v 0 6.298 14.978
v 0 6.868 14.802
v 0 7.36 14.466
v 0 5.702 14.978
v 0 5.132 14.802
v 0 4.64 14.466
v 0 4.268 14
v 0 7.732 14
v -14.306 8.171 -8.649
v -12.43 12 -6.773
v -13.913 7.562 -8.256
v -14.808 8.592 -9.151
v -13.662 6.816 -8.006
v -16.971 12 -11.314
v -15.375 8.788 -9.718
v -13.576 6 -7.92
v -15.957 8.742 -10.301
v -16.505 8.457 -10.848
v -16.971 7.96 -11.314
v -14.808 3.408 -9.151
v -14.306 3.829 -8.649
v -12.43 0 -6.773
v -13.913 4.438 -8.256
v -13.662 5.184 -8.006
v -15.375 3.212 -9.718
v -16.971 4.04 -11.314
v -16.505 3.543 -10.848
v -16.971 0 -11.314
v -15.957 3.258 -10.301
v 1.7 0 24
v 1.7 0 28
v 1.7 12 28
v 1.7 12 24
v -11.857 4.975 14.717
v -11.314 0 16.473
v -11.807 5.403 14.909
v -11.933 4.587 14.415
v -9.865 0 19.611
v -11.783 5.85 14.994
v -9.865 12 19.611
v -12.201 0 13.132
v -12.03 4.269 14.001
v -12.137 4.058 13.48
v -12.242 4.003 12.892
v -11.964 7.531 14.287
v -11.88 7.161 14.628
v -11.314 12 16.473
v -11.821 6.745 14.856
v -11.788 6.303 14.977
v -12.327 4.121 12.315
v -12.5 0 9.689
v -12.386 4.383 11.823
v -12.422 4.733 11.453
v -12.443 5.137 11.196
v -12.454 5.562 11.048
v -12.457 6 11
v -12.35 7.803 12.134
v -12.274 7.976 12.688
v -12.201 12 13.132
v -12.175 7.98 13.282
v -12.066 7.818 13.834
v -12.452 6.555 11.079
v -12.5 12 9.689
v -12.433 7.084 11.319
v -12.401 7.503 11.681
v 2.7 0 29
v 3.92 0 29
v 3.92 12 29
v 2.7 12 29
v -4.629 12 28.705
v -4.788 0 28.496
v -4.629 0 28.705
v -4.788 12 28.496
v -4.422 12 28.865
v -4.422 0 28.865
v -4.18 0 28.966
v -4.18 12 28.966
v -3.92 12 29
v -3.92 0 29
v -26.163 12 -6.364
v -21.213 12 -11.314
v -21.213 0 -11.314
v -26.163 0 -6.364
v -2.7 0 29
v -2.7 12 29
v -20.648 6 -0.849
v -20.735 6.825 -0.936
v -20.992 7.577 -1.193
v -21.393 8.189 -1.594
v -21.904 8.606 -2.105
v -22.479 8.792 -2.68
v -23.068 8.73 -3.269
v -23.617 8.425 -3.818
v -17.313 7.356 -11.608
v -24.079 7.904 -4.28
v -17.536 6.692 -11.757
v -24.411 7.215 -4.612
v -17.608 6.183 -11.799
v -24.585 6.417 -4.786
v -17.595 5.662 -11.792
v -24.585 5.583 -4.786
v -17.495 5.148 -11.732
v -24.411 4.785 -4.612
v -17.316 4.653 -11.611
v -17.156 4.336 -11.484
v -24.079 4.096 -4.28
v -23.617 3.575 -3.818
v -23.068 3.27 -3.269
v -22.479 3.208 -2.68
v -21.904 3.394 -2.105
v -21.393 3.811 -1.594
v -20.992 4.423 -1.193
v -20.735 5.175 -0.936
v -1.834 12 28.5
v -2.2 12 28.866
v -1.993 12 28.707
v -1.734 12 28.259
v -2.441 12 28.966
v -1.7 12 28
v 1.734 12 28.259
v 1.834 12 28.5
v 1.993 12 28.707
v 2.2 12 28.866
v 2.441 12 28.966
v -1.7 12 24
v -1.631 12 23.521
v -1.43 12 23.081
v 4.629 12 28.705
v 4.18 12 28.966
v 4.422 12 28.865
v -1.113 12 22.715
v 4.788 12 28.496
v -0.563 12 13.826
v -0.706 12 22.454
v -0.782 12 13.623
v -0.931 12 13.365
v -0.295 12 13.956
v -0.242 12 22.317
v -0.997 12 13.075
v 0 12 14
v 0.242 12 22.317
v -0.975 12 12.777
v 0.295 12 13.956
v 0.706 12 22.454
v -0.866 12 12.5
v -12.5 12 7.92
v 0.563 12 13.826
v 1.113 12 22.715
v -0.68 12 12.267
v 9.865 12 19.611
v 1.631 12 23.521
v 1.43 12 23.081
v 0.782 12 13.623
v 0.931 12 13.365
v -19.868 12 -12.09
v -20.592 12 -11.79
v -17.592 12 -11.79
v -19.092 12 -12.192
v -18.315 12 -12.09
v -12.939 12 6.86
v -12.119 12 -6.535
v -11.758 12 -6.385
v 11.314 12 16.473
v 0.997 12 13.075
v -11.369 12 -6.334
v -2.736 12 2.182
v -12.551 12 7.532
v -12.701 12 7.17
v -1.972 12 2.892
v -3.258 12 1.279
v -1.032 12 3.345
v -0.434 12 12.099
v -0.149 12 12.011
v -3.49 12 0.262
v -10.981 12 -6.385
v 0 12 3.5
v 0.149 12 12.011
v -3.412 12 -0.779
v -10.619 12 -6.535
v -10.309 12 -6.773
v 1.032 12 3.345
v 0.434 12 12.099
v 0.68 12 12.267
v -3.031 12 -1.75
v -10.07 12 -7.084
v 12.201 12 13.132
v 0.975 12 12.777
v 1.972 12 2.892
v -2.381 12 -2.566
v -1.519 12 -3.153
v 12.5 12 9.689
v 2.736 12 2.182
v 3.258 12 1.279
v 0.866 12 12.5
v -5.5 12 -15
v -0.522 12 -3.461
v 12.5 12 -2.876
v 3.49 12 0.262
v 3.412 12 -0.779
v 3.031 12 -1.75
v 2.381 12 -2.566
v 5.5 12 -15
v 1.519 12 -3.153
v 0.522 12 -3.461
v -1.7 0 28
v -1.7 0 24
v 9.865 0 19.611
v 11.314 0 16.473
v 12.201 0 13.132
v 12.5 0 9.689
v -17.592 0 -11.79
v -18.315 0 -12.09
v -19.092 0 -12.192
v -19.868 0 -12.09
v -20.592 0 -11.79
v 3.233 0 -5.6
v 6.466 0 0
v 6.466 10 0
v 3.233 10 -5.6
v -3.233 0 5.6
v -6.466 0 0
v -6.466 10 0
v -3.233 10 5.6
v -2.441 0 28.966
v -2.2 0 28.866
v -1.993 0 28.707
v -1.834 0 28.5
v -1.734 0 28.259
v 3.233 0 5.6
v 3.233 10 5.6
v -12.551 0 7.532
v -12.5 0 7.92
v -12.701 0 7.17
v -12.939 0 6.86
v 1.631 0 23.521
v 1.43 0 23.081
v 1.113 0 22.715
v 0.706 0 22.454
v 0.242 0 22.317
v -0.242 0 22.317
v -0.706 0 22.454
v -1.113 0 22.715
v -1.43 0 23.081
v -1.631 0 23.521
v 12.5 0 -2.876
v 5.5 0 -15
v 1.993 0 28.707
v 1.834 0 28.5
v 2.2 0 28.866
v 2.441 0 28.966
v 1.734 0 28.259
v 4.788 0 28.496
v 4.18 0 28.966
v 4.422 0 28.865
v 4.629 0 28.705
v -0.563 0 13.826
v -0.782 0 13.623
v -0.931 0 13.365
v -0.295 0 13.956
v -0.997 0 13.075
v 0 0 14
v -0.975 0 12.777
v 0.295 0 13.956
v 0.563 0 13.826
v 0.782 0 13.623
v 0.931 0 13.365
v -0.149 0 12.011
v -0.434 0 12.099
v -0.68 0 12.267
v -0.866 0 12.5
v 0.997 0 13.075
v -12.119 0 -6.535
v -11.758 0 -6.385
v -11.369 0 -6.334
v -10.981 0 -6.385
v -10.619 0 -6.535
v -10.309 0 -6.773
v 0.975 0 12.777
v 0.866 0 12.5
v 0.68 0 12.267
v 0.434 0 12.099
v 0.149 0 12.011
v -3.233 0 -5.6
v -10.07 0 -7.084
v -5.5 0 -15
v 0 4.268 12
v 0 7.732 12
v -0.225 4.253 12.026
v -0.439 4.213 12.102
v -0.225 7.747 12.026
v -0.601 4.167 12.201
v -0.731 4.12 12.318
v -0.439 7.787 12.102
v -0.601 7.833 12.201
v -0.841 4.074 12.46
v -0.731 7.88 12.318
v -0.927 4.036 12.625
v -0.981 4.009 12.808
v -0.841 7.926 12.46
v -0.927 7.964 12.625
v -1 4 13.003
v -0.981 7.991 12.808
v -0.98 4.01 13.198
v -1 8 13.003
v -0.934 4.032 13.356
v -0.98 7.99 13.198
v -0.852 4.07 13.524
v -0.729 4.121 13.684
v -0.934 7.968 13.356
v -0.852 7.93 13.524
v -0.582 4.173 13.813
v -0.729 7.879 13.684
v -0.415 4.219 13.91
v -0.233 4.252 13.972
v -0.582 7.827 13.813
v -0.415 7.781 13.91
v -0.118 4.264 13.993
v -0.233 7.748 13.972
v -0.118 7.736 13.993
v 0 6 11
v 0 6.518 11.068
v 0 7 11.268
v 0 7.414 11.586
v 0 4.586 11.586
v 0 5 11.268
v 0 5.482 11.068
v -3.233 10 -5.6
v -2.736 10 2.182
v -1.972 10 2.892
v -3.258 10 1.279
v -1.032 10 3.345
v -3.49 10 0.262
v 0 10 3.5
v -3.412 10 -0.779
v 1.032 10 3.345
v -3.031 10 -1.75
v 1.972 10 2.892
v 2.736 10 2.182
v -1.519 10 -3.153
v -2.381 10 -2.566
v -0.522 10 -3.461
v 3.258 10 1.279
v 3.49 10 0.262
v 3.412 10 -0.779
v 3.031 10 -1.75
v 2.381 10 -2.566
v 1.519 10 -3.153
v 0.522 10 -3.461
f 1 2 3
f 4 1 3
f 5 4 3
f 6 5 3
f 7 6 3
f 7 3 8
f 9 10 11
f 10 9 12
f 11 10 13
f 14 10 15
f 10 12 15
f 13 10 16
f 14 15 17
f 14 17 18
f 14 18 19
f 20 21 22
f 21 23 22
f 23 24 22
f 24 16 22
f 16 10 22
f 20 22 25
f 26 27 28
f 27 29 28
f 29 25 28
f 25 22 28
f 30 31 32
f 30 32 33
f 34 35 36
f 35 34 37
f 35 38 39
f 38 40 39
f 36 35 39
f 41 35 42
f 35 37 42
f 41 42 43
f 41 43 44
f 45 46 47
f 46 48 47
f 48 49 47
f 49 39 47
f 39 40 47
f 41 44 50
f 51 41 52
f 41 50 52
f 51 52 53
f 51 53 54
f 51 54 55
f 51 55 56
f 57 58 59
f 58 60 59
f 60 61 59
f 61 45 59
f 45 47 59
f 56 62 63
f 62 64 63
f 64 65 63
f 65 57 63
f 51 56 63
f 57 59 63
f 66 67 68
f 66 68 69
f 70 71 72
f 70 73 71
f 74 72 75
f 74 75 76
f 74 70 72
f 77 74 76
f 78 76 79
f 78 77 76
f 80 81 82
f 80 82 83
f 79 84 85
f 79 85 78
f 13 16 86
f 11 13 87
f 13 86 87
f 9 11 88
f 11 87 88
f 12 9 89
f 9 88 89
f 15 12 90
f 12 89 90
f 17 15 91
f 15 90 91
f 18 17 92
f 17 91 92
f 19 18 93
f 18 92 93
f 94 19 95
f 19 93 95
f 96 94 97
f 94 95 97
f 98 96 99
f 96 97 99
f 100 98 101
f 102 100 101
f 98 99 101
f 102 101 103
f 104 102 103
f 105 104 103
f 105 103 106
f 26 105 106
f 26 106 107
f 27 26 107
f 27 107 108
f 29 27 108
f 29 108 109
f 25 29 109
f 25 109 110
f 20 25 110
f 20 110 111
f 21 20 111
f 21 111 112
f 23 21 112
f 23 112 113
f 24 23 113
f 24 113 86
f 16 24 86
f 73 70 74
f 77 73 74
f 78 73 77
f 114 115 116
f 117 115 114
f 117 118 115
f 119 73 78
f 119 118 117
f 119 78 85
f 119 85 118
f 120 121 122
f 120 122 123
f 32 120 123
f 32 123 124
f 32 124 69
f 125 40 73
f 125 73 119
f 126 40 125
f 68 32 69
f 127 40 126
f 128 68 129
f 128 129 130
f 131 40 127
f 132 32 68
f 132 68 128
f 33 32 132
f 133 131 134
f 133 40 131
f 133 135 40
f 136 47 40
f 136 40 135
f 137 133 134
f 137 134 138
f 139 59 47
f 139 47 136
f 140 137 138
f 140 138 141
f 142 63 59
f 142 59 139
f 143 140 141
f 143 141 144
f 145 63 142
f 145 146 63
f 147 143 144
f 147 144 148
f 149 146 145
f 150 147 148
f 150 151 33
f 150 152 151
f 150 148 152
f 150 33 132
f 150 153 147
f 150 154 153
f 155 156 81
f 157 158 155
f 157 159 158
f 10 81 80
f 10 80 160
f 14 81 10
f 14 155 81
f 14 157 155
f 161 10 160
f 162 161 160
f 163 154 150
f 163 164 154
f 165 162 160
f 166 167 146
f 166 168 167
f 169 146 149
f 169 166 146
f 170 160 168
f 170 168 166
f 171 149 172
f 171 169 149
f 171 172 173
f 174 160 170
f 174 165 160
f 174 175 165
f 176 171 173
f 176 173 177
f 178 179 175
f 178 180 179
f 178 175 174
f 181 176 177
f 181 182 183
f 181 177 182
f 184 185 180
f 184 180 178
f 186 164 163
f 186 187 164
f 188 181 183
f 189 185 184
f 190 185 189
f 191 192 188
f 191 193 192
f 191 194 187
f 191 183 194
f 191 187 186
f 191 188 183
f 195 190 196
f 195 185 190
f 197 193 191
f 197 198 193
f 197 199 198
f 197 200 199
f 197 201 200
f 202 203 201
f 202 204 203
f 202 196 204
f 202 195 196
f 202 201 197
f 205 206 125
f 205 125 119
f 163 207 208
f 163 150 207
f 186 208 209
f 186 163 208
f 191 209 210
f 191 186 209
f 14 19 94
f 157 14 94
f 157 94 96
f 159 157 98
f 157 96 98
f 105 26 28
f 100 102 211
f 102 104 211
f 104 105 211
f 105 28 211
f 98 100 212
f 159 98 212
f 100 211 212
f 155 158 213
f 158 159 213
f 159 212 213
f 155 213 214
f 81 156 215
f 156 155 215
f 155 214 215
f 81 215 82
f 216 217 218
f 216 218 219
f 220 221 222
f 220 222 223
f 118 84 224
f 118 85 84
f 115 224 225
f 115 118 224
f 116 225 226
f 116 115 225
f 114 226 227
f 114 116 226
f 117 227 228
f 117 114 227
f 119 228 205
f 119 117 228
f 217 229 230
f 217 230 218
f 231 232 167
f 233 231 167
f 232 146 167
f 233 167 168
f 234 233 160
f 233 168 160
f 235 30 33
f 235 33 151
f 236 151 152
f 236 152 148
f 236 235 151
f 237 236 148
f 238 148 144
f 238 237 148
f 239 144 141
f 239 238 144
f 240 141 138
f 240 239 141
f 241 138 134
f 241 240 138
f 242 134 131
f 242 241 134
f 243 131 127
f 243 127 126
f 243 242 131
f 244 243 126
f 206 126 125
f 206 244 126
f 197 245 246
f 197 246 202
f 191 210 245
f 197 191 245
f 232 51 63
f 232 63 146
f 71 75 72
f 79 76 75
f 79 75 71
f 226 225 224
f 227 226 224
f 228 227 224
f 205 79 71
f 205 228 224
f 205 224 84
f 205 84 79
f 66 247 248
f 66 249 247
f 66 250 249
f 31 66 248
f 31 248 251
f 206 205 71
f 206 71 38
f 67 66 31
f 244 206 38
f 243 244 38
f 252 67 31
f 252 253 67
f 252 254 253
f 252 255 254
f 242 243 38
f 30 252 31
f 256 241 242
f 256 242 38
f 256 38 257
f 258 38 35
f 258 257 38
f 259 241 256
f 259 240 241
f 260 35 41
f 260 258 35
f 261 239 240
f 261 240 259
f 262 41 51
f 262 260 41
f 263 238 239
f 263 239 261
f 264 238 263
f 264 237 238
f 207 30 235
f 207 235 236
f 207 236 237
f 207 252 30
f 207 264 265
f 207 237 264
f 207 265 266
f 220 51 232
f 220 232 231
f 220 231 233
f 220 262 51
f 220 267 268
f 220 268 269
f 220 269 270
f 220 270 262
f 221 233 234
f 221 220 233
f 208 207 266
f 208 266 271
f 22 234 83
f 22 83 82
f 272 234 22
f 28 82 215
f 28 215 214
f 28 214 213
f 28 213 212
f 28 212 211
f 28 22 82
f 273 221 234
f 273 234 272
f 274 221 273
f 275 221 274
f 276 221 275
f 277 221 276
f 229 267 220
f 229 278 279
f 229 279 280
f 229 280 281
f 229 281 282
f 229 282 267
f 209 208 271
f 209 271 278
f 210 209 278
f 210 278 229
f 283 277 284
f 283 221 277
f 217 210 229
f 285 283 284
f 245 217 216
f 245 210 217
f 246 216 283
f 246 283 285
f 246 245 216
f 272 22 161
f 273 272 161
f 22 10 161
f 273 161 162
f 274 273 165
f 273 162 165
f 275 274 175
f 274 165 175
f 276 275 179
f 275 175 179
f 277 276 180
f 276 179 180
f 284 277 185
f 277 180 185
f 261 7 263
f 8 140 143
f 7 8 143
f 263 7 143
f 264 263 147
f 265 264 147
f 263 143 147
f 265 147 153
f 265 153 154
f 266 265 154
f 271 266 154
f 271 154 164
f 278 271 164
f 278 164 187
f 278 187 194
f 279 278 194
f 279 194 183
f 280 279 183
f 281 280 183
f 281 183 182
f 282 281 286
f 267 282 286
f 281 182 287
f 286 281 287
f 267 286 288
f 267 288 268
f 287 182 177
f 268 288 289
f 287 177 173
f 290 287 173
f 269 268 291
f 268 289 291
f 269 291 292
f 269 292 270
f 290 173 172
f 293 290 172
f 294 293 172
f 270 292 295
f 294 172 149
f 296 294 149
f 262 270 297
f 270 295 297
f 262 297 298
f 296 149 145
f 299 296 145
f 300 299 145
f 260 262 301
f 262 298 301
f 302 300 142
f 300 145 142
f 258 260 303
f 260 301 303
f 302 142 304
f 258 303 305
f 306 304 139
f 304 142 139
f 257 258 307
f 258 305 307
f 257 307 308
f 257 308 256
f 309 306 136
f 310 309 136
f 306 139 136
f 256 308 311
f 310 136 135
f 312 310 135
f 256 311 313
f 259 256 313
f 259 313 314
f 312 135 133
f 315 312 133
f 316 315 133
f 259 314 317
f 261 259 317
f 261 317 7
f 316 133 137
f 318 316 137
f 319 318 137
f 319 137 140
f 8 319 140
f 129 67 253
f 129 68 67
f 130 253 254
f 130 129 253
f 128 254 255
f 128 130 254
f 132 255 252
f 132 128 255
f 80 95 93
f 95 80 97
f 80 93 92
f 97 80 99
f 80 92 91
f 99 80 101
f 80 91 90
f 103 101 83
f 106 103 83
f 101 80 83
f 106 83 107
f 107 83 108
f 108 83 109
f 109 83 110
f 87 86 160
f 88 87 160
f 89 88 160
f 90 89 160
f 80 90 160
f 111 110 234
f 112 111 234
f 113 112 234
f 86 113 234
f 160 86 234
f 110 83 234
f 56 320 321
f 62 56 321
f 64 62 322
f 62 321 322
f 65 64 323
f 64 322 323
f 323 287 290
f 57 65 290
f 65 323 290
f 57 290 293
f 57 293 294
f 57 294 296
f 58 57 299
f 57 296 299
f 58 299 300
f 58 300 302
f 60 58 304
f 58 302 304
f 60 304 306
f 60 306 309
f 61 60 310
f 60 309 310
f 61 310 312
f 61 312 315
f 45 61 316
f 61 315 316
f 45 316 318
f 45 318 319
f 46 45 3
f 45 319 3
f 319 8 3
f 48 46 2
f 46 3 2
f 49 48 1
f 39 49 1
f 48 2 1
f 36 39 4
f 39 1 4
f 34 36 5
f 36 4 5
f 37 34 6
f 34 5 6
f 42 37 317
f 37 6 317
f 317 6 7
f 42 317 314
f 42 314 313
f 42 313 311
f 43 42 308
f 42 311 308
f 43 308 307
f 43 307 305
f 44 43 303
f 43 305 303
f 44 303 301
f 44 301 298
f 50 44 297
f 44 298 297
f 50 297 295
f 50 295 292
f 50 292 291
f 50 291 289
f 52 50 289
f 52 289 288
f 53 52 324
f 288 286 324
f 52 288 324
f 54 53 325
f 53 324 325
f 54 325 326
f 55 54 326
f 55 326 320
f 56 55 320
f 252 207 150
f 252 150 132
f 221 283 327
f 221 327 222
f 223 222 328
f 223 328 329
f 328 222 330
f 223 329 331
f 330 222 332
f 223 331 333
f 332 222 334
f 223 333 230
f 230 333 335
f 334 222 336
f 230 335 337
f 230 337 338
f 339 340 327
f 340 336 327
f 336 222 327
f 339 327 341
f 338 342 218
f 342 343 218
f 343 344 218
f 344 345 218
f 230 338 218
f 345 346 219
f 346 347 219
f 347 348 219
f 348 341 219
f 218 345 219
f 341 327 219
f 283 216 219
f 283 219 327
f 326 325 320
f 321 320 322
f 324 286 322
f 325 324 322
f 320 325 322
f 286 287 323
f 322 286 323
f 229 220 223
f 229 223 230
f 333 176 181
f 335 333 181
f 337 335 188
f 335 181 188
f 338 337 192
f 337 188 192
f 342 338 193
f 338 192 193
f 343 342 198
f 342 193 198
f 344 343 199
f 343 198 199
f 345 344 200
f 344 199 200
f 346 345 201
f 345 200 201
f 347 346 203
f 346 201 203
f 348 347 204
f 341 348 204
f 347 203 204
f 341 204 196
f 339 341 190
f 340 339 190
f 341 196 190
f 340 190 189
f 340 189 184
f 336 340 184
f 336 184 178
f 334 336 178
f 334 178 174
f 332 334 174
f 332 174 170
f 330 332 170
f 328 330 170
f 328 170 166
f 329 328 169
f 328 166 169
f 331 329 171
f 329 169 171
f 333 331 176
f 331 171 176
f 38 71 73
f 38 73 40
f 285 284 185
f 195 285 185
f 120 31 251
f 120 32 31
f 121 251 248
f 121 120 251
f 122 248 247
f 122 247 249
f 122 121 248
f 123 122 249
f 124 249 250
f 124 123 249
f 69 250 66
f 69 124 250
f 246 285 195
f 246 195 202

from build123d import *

# Parameters (mm, degrees)
SKETCH1_W           = 25
SKETCH1_H           = 30
BOSS_EXTRUDE1_DEPTH = 12
BOSS_EXTRUDE6_DEPTH = 12
CHAMFER1_SIZE       = 7
CHAMFER1_SIZE2      = 12.124355653
BOSS_EXTRUDE4_DEPTH = 12
SKETCH7_R           = 2.8
CUT_EXTRUDE2_DEPTH  = 12
CHAMFER2_SIZE       = 8
CHAMFER2_SIZE_2     = 14
CHAMFER3_SIZE       = 14
CHAMFER3_SIZE_2     = 8
FILLET2_R           = 20
FILLET3_R           = 1
FILLET4_R           = 1.5
SKETCH10_R          = 1
CUT_EXTRUDE3_DEPTH  = 41.859515416
SKETCH11_R          = 2
CUT_EXTRUDE4_DEPTH  = 41.859515416
SKETCH12_R          = 3.5
BOSS_EXTRUDE8_DEPTH = 2
FILLET5_R           = 3


with BuildPart() as part:
    # Sketch1 → Boss-Extrude1 (new body)
    with BuildSketch(Plane(origin=(0, 0, 0), x_dir=(1, 0, 0), z_dir=(0, 1, 0))):
        Rectangle(SKETCH1_W, SKETCH1_H)
        Polygon((3.233161507, -5.6), (6.466323015, 0), (3.233161507, 5.6), (-3.233161507, 5.6), (-6.466323015, 0), (-3.233161507, -5.6), align=None, mode=Mode.SUBTRACT)
    extrude(amount=BOSS_EXTRUDE1_DEPTH)

    # Sketch8 → Boss-Extrude6 (add)
    with BuildSketch(Plane(origin=(0, 0, 0), x_dir=(1, 0, 0), z_dir=(0, 1, 0))):
        with BuildLine():
            Line((-4.5, -15), (4.5, -15))
            Line((4.5, -15), (4.5, -29))
            Line((4.5, -29), (1.7, -29))
            Line((1.7, -29), (1.7, -24))
            ThreePointArc((1.7, -24), (0, -22.3), (-1.7, -24))
            Line((-1.7, -24), (-1.7, -29))
            Line((-1.7, -29), (-4.5, -29))
            Line((-4.5, -29), (-4.5, -15))
        make_face()
    extrude(amount=BOSS_EXTRUDE6_DEPTH)

    # Chamfer1
    chamfer1_edges = [part.edges().sort_by_distance(p)[0] for p in [
        (-12.5, 6, -15),
        (12.5, 6, -15),
    ]]
    chamfer1_side = [part.faces().sort_by_distance(p)[0] for p in [
        (0, 6, -15),
    ]]
    chamfer(chamfer1_edges, length=CHAMFER1_SIZE, length2=CHAMFER1_SIZE2, reference=chamfer1_side[0])

    # Sketch6 → Boss-Extrude4 (add)
    with BuildSketch(Plane(origin=(0, 0, 0), x_dir=(1, 0, 0), z_dir=(0, 1, 0))):
        Polygon((-26.162950904, 6.363961031), (-12.5, -7.298989873), (-12.5, 2.875644347), (-11.047793697, 5.390939447), (-19.091883092, 13.435028843), align=None)
    extrude(amount=BOSS_EXTRUDE4_DEPTH)

    # Sketch7 → Cut-Extrude2 (cut)
    with BuildSketch(Plane(origin=(-9.899494937, 0, 9.899494937), x_dir=(0.7071067811865438, 0, 0.7071067811865512), z_dir=(-0.7071067811865512, 0, 0.7071067811865438))):
        with Locations((-18, 6)):
            Circle(SKETCH7_R)
    extrude(amount=-CUT_EXTRUDE2_DEPTH, mode=Mode.SUBTRACT)

    # Chamfer2
    # the kernel refuses this chamfer: 14, 8 mm, written as the material it adds along each edge
    with BuildSketch(Plane(origin=(4.5, 0, 15), x_dir=(0.9982794274996464, 0, -0.05863603525971087), z_dir=(0, 1, 0))) as chamfer2_piece_1:
        Polygon((CHAMFER2_SIZE * 0.9982794275, -CHAMFER2_SIZE * 0.0586360352597), (-CHAMFER2_SIZE_2 * 0.0586360352597, -CHAMFER2_SIZE_2 * 0.9982794275), (0, 0), align=None)
    extrude(amount=12)

    # Chamfer3
    # the kernel refuses this chamfer: 14, 8 mm, written as the material it adds along each edge
    with BuildSketch(Plane(origin=(-4.5, 0, 15), x_dir=(0.019175933519162247, 0, 0.9998161248818048), z_dir=(0, 1, 0))) as chamfer3_piece_1:
        Polygon((CHAMFER3_SIZE * 0.999816124882, -CHAMFER3_SIZE * 0.0191759335192), (-CHAMFER3_SIZE_2 * 0.0191759335192, -CHAMFER3_SIZE_2 * 0.999816124882), (0, 0), align=None)
    extrude(amount=12)

    # Fillet2
    fillet2_edges = [part.edges().sort_by_distance(p)[0] for p in [
        (12.5, 6, 15),
        (-12.5, 6, 15),
    ]]
    fillet(fillet2_edges, radius=FILLET2_R)

    # Fillet3
    fillet3_edges = [part.edges().sort_by_distance(p)[0] for p in [
        (-4.5, 6, 29),
        (-1.7, 6, 29),
        (1.7, 6, 29),
        (4.5, 6, 29),
    ]]
    fillet(fillet3_edges, radius=FILLET3_R)

    # Fillet4
    fillet4_edges = [part.edges().sort_by_distance(p)[0] for p in [
        (-12.5, 6, 7.298989873),
        (-11.047793697, 6, -5.390939447),
    ]]
    fillet(fillet4_edges, radius=FILLET4_R)

    # Sketch10 → Cut-Extrude3 (cut, through all)
    with BuildSketch(Plane(origin=(0, 12, 0), x_dir=(1, 0, 0), z_dir=(0, 1, 0))):
        with Locations(Location((0, -13, 0), (0, 0, 270))):
            Circle(SKETCH10_R)
    extrude(amount=-CUT_EXTRUDE3_DEPTH, mode=Mode.SUBTRACT)

    # Sketch11 → Cut-Extrude4 (cut, through all)
    with BuildSketch(Plane(origin=(0, 0, 0), x_dir=(0, 0, -1), z_dir=(1, 0, 0))):
        with Locations((-13, 6)):
            Circle(SKETCH11_R)
    extrude(amount=-CUT_EXTRUDE4_DEPTH, mode=Mode.SUBTRACT)

    # Sketch12 → Boss-Extrude8 (add)
    with BuildSketch(Plane(origin=(0, 12, 0), x_dir=(1, 0, 0), z_dir=(0, 1, 0))):
        Polygon((3.233161507, 5.6), (-3.233161507, 5.6), (-6.466323015, 0), (-3.233161507, -5.6), (3.233161507, -5.6), (6.466323015, 0), align=None)
        with Locations(Location((0, 0, 0), (0, 0, 270))):
            Circle(SKETCH12_R, mode=Mode.SUBTRACT)
    extrude(amount=-BOSS_EXTRUDE8_DEPTH)

    # Fillet5
    # the kernel refuses this fillet: 3 mm, written as the material it takes off along each edge
    with BuildSketch(Plane(origin=(-19.091883092, -7.5, -13.435028843), x_dir=(-0.7071067811865517, 0, 0.7071067811865434), z_dir=(0, 1, 0))) as fillet5_piece_1:
        with BuildLine():
            CenterArc((FILLET5_R, FILLET5_R), FILLET5_R, 180, 90)
            Line((0, FILLET5_R), (0, 0))
            Line((0, 0), (FILLET5_R, 0))
        make_face()
    extrude(amount=27, mode=Mode.SUBTRACT)


solid = part.part
